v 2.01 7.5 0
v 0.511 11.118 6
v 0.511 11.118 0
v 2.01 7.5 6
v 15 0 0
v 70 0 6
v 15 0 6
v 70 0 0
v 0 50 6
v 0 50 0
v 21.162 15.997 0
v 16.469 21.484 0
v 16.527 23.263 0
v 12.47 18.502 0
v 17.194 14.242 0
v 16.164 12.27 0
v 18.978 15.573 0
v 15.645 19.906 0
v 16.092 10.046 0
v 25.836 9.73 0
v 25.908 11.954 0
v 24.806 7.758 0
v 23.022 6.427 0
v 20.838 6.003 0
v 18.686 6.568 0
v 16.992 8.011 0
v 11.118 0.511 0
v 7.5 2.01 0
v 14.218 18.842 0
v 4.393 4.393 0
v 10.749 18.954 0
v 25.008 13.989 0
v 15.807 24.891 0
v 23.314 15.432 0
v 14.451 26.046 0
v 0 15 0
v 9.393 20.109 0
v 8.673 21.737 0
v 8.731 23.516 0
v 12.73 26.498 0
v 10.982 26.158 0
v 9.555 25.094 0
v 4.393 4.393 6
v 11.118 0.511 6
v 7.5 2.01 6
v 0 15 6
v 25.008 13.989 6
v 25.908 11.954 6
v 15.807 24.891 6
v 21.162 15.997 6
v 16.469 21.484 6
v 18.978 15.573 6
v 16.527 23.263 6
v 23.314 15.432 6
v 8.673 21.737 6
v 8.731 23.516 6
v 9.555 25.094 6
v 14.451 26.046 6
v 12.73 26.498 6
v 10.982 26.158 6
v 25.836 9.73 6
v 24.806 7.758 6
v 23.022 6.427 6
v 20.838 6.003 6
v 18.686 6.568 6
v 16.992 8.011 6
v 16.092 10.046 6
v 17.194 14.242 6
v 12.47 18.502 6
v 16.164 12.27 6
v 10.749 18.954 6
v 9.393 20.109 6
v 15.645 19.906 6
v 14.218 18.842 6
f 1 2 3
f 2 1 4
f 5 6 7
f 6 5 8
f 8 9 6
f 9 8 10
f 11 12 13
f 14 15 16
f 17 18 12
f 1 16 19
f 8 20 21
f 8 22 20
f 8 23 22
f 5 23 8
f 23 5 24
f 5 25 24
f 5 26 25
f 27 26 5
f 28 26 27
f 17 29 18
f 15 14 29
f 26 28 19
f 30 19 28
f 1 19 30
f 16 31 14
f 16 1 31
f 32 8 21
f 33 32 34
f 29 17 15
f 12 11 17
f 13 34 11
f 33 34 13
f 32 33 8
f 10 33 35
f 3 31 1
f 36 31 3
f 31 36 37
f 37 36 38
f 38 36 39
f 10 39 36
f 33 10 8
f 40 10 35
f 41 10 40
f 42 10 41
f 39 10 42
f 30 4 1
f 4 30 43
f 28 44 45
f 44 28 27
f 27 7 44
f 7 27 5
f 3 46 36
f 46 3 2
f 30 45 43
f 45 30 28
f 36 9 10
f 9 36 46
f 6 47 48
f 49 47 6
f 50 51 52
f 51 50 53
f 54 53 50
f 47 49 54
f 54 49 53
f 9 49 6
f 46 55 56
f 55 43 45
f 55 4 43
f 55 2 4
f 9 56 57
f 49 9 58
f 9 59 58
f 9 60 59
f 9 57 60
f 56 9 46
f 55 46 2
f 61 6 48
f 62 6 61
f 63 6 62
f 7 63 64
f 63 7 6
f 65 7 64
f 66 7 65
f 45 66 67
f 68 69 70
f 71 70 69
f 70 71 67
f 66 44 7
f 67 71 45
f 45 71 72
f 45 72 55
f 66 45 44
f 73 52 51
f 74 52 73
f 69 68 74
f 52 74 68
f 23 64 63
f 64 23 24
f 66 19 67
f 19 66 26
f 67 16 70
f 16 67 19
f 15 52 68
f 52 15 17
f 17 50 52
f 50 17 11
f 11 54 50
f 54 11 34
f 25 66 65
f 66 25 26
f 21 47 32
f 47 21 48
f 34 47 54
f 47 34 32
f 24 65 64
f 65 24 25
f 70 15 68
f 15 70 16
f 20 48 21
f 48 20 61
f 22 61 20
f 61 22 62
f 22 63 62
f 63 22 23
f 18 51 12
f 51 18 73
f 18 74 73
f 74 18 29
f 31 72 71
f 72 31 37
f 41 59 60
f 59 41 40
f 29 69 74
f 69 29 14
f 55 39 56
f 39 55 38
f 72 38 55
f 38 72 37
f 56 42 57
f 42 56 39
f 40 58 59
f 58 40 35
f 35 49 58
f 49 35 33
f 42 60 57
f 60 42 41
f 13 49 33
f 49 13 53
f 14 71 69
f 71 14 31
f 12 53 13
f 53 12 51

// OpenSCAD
$fn = 32;

// ----------------------------------------------------------------------
// Bracket plate: corner pad 70 x 50, fillet R15
// ----------------------------------------------------------------------

// --- parameters (mm) ---
hole_r = 4;               // bolt hole radius
plate_t = 6;              // plate thickness, Z (extrusion height)
leg_a = 70;               // base leg
leg_b = 50;               // height leg
fillet_r = 15;            // right-angle fillet radius
fit_tol = 0.02;           // declared fit tolerance (prompt contract)
free_tol = 0.2;           // declared free tolerance (prompt contract)

hole_d1 = 2 * hole_r + 2;
hole_d2 = 2 * hole_r;

profile = [[15, 0], [70, 0], [0, 50], [0, 15], [0.511, 11.118], [2.01, 7.5], [4.393, 4.393], [7.5, 2.01], [11.118, 0.511]];  // primary outline, 9 points, counter clockwise
void_1 = [[25.908, 11.954], [25.008, 13.989], [23.314, 15.432], [21.162, 15.997], [18.978, 15.573], [17.194, 14.242], [16.164, 12.27], [16.092, 10.046], [16.992, 8.011], [18.686, 6.568], [20.838, 6.003], [23.022, 6.427], [24.806, 7.758], [25.836, 9.73]];  // mount hole 1, 14 points
void_2 = [[16.527, 23.263], [15.807, 24.891], [14.451, 26.046], [12.73, 26.498], [10.982, 26.158], [9.555, 25.094], [8.731, 23.516], [8.673, 21.737], [9.393, 20.109], [10.749, 18.954], [12.47, 18.502], [14.218, 18.842], [15.645, 19.906], [16.469, 21.484]];  // mount hole 2, 14 points

// --- the one profile operation ---
difference() {
  linear_extrude(height = plate_t) polygon(points = profile);
  translate([0, 0, -1])
    linear_extrude(height = plate_t + 2) polygon(points = void_1);
  translate([0, 0, -1])
    linear_extrude(height = plate_t + 2) polygon(points = void_2);
}
